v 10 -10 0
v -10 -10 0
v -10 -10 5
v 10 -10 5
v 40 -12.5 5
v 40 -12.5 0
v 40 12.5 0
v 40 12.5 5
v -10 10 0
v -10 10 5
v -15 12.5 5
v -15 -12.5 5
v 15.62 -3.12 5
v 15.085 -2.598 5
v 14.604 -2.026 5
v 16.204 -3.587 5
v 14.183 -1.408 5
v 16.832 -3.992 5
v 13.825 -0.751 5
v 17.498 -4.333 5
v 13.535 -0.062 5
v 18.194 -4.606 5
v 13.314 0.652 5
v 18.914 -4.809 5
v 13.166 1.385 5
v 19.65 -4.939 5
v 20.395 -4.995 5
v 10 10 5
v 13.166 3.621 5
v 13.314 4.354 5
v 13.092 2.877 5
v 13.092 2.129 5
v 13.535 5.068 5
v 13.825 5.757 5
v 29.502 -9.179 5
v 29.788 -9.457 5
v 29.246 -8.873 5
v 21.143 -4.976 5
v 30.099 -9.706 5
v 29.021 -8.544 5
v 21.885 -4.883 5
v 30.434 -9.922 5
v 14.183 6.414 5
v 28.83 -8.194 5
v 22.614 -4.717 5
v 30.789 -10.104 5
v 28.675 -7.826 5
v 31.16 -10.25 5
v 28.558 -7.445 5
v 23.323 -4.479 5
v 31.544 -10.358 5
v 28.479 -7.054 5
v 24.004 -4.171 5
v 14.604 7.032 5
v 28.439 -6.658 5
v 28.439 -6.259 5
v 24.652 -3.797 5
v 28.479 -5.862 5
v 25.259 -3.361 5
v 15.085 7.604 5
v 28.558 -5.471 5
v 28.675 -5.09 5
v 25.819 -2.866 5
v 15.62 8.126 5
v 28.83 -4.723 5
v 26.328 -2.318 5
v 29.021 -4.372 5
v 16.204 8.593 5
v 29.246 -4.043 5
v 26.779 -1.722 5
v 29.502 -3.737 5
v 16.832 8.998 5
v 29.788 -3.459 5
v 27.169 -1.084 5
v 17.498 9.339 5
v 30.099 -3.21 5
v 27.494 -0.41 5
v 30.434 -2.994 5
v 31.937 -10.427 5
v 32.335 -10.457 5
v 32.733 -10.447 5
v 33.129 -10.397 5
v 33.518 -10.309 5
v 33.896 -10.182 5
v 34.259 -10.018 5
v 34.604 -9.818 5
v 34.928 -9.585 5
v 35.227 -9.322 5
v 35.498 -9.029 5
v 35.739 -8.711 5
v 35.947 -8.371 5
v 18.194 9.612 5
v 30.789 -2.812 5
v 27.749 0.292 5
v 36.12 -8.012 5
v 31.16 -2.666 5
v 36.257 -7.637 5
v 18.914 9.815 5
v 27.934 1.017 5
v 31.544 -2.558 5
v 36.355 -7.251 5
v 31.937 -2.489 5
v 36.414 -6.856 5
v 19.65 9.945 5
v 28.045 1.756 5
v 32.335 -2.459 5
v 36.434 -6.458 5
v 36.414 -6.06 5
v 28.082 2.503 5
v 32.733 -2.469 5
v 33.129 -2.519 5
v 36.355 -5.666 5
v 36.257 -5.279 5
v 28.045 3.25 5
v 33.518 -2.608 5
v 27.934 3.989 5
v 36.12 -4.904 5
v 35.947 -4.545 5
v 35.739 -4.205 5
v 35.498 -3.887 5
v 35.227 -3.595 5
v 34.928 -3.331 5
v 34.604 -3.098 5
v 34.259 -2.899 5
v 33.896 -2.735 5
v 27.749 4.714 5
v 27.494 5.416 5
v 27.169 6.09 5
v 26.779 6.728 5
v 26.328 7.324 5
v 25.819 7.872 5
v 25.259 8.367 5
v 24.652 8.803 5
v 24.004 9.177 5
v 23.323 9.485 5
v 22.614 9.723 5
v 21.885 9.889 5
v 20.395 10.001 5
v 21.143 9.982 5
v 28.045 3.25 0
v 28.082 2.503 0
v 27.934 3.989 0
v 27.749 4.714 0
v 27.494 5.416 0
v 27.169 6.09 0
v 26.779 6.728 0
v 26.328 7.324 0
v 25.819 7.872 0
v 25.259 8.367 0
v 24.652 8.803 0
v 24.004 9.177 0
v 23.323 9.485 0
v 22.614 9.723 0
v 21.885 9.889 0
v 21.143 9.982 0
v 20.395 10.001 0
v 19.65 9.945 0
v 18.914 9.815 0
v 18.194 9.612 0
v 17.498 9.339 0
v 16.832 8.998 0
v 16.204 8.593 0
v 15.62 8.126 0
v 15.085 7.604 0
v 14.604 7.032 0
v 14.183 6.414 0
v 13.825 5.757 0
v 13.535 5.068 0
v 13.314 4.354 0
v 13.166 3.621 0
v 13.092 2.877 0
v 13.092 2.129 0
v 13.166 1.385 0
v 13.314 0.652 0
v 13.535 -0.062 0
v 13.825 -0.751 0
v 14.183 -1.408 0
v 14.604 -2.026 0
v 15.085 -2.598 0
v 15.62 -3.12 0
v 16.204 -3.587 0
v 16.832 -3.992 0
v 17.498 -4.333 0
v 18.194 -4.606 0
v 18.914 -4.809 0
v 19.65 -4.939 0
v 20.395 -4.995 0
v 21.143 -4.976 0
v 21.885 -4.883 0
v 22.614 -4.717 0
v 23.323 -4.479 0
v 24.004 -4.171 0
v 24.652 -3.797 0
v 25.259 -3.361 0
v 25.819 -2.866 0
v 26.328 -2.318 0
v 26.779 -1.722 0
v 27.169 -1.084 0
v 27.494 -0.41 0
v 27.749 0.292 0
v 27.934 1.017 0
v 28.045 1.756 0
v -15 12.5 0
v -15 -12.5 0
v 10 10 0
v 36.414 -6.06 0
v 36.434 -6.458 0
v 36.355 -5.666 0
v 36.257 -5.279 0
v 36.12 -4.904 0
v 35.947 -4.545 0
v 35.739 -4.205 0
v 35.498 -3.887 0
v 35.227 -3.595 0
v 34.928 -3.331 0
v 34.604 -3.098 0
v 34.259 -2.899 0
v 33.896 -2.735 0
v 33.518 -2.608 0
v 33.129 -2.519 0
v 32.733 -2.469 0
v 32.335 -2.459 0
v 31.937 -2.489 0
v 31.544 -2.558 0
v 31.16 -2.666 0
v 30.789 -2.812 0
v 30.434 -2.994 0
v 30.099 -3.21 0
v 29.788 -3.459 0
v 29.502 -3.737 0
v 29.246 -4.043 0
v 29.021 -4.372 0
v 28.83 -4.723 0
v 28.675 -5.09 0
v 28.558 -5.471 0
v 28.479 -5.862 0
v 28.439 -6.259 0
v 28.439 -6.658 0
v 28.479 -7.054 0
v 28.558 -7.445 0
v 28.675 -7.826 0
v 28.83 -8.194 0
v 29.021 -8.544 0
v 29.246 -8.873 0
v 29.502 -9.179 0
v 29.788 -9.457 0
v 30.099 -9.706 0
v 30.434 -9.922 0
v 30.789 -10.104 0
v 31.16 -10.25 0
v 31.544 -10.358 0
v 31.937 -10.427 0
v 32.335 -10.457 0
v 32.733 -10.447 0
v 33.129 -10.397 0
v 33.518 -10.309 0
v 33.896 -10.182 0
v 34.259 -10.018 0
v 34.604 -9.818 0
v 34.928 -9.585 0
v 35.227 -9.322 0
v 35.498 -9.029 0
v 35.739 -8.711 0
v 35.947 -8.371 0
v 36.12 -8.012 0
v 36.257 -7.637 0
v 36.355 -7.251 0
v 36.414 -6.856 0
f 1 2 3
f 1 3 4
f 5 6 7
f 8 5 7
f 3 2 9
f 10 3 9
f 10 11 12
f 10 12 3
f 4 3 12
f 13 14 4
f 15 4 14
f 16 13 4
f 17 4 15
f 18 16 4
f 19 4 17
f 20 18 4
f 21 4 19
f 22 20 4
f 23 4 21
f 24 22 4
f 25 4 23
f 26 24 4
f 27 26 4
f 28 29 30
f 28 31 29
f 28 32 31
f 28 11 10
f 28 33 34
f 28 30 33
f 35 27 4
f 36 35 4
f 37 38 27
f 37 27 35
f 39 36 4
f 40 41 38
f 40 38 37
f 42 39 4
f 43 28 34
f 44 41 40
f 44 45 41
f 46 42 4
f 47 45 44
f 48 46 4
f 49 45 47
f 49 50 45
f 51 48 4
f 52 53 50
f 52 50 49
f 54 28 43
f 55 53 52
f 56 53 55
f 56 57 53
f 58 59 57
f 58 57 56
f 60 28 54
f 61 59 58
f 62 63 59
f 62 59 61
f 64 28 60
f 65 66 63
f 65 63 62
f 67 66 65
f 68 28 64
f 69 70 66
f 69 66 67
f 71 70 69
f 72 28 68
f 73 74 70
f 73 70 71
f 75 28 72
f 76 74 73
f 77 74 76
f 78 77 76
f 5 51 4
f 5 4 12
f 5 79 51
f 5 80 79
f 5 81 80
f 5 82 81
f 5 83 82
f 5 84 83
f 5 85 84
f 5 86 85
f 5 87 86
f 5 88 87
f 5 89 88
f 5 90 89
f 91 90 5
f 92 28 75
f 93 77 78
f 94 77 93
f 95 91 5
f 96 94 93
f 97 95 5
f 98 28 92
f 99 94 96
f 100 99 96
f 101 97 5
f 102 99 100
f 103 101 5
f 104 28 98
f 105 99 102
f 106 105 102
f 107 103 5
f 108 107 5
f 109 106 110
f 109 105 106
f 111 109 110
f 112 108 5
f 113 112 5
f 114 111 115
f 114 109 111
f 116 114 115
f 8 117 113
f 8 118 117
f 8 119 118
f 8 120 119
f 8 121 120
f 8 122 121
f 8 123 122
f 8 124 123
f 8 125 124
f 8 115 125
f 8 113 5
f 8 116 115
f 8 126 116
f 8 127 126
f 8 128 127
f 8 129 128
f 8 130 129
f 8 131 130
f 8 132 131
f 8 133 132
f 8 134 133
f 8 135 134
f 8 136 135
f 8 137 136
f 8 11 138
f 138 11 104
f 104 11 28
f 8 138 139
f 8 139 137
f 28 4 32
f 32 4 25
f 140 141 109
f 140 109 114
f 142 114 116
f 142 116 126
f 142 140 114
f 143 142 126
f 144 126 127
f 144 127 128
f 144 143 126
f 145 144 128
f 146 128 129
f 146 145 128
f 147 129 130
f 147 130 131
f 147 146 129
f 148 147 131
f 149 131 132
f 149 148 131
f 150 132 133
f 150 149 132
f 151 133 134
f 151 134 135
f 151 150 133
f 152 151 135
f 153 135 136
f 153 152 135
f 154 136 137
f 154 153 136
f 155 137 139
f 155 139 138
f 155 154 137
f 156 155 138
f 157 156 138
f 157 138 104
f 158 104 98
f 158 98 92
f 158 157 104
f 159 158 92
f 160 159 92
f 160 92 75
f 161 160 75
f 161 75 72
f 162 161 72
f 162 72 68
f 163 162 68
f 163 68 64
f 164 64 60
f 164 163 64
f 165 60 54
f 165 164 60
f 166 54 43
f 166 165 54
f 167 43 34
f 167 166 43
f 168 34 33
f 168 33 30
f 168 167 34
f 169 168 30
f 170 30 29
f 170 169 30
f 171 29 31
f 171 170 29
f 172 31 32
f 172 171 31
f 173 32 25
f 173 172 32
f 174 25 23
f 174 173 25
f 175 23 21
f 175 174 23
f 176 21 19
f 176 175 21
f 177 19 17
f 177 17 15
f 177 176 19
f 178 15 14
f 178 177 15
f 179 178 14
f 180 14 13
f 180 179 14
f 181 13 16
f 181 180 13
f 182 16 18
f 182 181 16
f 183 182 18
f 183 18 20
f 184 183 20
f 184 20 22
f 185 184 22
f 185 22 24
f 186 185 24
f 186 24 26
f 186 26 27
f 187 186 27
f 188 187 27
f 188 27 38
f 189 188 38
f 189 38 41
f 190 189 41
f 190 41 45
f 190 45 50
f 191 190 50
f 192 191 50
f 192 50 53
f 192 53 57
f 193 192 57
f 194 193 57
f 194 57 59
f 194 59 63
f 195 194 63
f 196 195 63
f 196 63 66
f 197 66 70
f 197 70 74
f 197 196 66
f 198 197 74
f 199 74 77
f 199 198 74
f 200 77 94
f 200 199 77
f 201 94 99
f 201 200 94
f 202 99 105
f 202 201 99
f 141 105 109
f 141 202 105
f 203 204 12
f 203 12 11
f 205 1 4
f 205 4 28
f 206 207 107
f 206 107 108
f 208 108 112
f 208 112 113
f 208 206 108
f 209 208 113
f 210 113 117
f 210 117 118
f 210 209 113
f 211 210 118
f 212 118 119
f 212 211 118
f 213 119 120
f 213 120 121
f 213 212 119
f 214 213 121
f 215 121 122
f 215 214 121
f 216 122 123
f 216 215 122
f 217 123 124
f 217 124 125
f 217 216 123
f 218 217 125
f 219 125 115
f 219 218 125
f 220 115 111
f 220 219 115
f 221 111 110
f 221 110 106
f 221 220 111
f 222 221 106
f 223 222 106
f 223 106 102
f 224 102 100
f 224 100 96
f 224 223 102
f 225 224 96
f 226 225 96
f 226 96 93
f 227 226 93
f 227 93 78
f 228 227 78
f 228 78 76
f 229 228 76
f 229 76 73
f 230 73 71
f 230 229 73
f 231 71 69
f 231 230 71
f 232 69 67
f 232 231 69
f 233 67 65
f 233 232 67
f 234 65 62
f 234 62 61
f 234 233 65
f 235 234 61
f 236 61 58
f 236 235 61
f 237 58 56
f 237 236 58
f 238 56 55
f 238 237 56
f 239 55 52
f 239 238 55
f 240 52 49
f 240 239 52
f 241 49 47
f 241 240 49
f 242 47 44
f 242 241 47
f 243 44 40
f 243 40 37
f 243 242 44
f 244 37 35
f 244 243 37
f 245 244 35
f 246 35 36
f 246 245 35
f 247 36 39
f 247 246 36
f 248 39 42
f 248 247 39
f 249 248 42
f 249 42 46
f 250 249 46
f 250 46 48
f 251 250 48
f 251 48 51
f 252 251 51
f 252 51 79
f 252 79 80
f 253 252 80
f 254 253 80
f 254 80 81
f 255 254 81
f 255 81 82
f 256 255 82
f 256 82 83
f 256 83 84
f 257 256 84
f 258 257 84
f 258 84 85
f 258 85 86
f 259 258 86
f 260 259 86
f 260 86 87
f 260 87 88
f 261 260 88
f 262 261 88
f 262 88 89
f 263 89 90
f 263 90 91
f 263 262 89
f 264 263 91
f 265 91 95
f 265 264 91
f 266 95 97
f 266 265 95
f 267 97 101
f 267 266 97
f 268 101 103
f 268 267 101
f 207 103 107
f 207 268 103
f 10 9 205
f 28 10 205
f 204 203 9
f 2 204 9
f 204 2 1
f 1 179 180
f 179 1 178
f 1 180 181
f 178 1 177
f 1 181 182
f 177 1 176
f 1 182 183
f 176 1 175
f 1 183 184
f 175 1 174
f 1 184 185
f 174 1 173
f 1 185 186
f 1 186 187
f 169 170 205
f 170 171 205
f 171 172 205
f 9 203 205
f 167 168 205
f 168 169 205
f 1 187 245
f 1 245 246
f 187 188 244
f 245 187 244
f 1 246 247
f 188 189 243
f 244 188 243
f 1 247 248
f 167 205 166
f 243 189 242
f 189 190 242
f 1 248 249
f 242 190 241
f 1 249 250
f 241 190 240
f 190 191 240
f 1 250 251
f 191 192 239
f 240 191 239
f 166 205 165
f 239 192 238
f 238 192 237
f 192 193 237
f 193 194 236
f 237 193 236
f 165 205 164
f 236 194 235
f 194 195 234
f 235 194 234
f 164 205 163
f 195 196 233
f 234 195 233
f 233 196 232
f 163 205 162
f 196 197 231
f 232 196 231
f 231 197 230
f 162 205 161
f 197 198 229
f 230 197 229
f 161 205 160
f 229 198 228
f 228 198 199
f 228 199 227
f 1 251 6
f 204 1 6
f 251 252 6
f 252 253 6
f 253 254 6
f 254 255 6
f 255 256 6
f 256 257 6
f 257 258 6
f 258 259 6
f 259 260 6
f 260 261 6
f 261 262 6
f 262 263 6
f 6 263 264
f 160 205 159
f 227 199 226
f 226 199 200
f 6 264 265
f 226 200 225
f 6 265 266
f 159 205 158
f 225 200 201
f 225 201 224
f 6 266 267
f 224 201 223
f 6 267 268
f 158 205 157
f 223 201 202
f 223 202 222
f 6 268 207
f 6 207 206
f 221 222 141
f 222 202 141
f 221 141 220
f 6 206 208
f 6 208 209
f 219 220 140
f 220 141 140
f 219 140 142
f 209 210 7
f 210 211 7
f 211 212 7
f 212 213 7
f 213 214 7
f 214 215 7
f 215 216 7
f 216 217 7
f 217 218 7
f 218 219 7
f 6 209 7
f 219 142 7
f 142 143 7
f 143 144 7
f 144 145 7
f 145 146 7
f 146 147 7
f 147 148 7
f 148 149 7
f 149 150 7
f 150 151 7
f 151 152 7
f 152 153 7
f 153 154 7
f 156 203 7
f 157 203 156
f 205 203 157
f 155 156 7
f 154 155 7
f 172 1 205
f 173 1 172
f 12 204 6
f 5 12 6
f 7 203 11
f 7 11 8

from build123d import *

# Parameters (mm, degrees)
F0_W     = 55
F0_H     = 25
F0_R     = 4
F0_W_2   = 20
F0_H_2   = 20
F0_R_2   = 7.5
F1_DEPTH = 5


with BuildPart() as f1:
    # F0 (on Top) → F1 (new body)
    with BuildSketch(Plane.XY):
        with Locations((12.5, 0)):
            Rectangle(F0_W, F0_H)
        with Locations((32.434259, -6.458126)):
            Circle(F0_R, mode=Mode.SUBTRACT)
        Rectangle(F0_W_2, F0_H_2, mode=Mode.SUBTRACT)
        with Locations((20.582465, 2.502987)):
            Circle(F0_R_2, mode=Mode.SUBTRACT)
    extrude(amount=F1_DEPTH)


solid = f1.part
